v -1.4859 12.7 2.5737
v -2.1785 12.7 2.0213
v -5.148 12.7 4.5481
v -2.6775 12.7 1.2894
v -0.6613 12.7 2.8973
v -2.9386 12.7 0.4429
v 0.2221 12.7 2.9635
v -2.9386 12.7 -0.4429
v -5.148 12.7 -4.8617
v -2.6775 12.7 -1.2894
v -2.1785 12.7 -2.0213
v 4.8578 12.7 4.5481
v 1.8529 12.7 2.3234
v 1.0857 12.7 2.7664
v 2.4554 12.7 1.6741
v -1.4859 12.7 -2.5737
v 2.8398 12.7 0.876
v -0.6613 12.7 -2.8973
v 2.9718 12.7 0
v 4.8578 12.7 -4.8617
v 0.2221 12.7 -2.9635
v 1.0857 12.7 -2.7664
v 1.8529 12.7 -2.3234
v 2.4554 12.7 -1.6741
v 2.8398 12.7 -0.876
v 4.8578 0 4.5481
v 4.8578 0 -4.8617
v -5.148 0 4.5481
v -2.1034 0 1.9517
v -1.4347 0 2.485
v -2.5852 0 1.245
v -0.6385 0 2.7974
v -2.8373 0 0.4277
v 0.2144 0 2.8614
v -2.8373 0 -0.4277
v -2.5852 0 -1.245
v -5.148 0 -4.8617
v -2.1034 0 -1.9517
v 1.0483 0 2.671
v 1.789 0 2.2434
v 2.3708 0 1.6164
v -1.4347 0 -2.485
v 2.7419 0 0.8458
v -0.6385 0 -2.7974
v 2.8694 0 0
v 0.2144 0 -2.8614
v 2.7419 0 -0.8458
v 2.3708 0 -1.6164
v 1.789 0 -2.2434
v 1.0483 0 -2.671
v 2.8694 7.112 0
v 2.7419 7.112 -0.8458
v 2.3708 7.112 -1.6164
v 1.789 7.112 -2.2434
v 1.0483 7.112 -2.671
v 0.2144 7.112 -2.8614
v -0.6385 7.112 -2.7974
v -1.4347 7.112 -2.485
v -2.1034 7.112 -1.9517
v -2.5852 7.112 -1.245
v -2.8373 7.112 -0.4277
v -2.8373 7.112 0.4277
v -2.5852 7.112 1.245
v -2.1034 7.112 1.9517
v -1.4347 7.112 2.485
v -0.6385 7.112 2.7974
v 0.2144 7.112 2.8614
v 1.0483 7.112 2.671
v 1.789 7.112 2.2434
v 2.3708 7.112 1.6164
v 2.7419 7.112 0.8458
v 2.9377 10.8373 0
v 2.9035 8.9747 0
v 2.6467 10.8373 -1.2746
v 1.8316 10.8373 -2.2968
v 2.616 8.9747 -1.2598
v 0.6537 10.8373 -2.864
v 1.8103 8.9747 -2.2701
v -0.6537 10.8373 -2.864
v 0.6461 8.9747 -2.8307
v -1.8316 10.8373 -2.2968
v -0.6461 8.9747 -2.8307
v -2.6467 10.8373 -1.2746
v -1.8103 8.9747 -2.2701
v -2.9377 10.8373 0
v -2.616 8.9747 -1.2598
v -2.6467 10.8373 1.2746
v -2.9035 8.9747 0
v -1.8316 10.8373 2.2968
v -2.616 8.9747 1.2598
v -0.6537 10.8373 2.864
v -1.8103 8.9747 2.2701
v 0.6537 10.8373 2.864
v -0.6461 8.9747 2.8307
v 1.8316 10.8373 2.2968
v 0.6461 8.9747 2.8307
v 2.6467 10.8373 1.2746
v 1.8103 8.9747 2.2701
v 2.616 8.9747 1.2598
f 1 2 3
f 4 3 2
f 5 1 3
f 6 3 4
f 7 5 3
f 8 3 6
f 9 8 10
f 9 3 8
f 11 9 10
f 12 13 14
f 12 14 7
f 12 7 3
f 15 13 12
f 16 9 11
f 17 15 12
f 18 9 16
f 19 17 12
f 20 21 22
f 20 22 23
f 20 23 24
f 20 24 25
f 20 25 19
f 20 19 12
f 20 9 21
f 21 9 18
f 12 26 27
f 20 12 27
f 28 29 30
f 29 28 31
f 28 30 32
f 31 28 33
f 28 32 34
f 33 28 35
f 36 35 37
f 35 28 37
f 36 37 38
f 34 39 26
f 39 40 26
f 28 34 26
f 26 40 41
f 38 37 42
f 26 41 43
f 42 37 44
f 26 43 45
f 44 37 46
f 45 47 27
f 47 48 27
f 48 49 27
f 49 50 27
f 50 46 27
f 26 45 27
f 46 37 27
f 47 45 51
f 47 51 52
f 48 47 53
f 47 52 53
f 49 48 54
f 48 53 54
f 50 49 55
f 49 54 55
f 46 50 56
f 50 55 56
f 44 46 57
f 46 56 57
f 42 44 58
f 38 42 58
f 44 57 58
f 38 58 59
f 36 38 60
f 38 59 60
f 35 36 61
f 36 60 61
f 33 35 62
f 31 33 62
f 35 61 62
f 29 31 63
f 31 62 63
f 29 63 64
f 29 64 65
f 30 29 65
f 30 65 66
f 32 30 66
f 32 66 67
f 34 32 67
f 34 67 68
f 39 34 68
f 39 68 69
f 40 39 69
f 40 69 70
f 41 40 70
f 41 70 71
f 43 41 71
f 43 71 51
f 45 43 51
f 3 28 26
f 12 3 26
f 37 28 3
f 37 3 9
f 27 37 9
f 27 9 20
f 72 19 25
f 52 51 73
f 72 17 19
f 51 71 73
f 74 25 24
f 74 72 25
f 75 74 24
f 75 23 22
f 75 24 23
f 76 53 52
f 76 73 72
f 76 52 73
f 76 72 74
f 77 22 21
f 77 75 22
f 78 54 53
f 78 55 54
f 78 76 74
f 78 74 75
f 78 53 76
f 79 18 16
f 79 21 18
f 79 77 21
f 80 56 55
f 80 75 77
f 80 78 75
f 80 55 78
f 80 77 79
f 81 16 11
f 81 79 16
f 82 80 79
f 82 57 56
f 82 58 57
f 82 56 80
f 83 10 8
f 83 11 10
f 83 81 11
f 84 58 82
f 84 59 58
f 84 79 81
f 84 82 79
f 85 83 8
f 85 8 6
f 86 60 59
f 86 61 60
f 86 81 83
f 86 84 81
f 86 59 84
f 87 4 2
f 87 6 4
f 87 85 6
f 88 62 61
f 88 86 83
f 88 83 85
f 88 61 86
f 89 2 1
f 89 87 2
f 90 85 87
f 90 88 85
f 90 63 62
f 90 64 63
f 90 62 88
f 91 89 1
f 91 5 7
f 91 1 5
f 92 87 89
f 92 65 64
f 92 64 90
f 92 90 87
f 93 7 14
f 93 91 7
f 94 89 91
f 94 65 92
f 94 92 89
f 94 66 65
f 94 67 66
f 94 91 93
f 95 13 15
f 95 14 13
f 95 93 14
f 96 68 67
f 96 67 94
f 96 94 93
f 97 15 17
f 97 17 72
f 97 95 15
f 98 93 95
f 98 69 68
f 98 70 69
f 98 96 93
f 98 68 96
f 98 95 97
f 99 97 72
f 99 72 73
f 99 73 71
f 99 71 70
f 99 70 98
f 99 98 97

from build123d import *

# Parameters (mm, degrees)
SKETCH7_W           = 10.005786465
SKETCH7_H           = 9.409830531
BOSS_EXTRUDE2_DEPTH = 12.7
SKETCH8_R           = 2.9718
CUT_EXTRUDE1_DEPTH  = 5.588
CUT_EXTRUDE1_TAPER  = 1.05
SKETCH11_R          = 2.869383086
CUT_EXTRUDE2_DEPTH  = 8.112


with BuildPart() as part:
    # Sketch7 → Boss-Extrude2 (new body)
    with BuildSketch(Plane(origin=(0, 0, 0), x_dir=(1, 0, 0), z_dir=(0, 1, 0))):
        with Locations((-0.145137292, 0.156830508)):
            Rectangle(SKETCH7_W, SKETCH7_H)
    extrude(amount=BOSS_EXTRUDE2_DEPTH)

    # Sketch8 → Cut-Extrude1 (cut)
    with BuildSketch(Plane(origin=(0, 12.7, 0), x_dir=(1, 0, 0), z_dir=(0, 1, 0))):
        Circle(SKETCH8_R)
    extrude(amount=-CUT_EXTRUDE1_DEPTH, taper=CUT_EXTRUDE1_TAPER, mode=Mode.SUBTRACT)

    # Sketch11 → Cut-Extrude2 (cut, through all)
    with BuildSketch(Plane(origin=(0, 7.112, 0), x_dir=(1, 0, 0), z_dir=(0, 1, 0))):
        Circle(SKETCH11_R)
    extrude(amount=-CUT_EXTRUDE2_DEPTH, mode=Mode.SUBTRACT)


solid = part.part
